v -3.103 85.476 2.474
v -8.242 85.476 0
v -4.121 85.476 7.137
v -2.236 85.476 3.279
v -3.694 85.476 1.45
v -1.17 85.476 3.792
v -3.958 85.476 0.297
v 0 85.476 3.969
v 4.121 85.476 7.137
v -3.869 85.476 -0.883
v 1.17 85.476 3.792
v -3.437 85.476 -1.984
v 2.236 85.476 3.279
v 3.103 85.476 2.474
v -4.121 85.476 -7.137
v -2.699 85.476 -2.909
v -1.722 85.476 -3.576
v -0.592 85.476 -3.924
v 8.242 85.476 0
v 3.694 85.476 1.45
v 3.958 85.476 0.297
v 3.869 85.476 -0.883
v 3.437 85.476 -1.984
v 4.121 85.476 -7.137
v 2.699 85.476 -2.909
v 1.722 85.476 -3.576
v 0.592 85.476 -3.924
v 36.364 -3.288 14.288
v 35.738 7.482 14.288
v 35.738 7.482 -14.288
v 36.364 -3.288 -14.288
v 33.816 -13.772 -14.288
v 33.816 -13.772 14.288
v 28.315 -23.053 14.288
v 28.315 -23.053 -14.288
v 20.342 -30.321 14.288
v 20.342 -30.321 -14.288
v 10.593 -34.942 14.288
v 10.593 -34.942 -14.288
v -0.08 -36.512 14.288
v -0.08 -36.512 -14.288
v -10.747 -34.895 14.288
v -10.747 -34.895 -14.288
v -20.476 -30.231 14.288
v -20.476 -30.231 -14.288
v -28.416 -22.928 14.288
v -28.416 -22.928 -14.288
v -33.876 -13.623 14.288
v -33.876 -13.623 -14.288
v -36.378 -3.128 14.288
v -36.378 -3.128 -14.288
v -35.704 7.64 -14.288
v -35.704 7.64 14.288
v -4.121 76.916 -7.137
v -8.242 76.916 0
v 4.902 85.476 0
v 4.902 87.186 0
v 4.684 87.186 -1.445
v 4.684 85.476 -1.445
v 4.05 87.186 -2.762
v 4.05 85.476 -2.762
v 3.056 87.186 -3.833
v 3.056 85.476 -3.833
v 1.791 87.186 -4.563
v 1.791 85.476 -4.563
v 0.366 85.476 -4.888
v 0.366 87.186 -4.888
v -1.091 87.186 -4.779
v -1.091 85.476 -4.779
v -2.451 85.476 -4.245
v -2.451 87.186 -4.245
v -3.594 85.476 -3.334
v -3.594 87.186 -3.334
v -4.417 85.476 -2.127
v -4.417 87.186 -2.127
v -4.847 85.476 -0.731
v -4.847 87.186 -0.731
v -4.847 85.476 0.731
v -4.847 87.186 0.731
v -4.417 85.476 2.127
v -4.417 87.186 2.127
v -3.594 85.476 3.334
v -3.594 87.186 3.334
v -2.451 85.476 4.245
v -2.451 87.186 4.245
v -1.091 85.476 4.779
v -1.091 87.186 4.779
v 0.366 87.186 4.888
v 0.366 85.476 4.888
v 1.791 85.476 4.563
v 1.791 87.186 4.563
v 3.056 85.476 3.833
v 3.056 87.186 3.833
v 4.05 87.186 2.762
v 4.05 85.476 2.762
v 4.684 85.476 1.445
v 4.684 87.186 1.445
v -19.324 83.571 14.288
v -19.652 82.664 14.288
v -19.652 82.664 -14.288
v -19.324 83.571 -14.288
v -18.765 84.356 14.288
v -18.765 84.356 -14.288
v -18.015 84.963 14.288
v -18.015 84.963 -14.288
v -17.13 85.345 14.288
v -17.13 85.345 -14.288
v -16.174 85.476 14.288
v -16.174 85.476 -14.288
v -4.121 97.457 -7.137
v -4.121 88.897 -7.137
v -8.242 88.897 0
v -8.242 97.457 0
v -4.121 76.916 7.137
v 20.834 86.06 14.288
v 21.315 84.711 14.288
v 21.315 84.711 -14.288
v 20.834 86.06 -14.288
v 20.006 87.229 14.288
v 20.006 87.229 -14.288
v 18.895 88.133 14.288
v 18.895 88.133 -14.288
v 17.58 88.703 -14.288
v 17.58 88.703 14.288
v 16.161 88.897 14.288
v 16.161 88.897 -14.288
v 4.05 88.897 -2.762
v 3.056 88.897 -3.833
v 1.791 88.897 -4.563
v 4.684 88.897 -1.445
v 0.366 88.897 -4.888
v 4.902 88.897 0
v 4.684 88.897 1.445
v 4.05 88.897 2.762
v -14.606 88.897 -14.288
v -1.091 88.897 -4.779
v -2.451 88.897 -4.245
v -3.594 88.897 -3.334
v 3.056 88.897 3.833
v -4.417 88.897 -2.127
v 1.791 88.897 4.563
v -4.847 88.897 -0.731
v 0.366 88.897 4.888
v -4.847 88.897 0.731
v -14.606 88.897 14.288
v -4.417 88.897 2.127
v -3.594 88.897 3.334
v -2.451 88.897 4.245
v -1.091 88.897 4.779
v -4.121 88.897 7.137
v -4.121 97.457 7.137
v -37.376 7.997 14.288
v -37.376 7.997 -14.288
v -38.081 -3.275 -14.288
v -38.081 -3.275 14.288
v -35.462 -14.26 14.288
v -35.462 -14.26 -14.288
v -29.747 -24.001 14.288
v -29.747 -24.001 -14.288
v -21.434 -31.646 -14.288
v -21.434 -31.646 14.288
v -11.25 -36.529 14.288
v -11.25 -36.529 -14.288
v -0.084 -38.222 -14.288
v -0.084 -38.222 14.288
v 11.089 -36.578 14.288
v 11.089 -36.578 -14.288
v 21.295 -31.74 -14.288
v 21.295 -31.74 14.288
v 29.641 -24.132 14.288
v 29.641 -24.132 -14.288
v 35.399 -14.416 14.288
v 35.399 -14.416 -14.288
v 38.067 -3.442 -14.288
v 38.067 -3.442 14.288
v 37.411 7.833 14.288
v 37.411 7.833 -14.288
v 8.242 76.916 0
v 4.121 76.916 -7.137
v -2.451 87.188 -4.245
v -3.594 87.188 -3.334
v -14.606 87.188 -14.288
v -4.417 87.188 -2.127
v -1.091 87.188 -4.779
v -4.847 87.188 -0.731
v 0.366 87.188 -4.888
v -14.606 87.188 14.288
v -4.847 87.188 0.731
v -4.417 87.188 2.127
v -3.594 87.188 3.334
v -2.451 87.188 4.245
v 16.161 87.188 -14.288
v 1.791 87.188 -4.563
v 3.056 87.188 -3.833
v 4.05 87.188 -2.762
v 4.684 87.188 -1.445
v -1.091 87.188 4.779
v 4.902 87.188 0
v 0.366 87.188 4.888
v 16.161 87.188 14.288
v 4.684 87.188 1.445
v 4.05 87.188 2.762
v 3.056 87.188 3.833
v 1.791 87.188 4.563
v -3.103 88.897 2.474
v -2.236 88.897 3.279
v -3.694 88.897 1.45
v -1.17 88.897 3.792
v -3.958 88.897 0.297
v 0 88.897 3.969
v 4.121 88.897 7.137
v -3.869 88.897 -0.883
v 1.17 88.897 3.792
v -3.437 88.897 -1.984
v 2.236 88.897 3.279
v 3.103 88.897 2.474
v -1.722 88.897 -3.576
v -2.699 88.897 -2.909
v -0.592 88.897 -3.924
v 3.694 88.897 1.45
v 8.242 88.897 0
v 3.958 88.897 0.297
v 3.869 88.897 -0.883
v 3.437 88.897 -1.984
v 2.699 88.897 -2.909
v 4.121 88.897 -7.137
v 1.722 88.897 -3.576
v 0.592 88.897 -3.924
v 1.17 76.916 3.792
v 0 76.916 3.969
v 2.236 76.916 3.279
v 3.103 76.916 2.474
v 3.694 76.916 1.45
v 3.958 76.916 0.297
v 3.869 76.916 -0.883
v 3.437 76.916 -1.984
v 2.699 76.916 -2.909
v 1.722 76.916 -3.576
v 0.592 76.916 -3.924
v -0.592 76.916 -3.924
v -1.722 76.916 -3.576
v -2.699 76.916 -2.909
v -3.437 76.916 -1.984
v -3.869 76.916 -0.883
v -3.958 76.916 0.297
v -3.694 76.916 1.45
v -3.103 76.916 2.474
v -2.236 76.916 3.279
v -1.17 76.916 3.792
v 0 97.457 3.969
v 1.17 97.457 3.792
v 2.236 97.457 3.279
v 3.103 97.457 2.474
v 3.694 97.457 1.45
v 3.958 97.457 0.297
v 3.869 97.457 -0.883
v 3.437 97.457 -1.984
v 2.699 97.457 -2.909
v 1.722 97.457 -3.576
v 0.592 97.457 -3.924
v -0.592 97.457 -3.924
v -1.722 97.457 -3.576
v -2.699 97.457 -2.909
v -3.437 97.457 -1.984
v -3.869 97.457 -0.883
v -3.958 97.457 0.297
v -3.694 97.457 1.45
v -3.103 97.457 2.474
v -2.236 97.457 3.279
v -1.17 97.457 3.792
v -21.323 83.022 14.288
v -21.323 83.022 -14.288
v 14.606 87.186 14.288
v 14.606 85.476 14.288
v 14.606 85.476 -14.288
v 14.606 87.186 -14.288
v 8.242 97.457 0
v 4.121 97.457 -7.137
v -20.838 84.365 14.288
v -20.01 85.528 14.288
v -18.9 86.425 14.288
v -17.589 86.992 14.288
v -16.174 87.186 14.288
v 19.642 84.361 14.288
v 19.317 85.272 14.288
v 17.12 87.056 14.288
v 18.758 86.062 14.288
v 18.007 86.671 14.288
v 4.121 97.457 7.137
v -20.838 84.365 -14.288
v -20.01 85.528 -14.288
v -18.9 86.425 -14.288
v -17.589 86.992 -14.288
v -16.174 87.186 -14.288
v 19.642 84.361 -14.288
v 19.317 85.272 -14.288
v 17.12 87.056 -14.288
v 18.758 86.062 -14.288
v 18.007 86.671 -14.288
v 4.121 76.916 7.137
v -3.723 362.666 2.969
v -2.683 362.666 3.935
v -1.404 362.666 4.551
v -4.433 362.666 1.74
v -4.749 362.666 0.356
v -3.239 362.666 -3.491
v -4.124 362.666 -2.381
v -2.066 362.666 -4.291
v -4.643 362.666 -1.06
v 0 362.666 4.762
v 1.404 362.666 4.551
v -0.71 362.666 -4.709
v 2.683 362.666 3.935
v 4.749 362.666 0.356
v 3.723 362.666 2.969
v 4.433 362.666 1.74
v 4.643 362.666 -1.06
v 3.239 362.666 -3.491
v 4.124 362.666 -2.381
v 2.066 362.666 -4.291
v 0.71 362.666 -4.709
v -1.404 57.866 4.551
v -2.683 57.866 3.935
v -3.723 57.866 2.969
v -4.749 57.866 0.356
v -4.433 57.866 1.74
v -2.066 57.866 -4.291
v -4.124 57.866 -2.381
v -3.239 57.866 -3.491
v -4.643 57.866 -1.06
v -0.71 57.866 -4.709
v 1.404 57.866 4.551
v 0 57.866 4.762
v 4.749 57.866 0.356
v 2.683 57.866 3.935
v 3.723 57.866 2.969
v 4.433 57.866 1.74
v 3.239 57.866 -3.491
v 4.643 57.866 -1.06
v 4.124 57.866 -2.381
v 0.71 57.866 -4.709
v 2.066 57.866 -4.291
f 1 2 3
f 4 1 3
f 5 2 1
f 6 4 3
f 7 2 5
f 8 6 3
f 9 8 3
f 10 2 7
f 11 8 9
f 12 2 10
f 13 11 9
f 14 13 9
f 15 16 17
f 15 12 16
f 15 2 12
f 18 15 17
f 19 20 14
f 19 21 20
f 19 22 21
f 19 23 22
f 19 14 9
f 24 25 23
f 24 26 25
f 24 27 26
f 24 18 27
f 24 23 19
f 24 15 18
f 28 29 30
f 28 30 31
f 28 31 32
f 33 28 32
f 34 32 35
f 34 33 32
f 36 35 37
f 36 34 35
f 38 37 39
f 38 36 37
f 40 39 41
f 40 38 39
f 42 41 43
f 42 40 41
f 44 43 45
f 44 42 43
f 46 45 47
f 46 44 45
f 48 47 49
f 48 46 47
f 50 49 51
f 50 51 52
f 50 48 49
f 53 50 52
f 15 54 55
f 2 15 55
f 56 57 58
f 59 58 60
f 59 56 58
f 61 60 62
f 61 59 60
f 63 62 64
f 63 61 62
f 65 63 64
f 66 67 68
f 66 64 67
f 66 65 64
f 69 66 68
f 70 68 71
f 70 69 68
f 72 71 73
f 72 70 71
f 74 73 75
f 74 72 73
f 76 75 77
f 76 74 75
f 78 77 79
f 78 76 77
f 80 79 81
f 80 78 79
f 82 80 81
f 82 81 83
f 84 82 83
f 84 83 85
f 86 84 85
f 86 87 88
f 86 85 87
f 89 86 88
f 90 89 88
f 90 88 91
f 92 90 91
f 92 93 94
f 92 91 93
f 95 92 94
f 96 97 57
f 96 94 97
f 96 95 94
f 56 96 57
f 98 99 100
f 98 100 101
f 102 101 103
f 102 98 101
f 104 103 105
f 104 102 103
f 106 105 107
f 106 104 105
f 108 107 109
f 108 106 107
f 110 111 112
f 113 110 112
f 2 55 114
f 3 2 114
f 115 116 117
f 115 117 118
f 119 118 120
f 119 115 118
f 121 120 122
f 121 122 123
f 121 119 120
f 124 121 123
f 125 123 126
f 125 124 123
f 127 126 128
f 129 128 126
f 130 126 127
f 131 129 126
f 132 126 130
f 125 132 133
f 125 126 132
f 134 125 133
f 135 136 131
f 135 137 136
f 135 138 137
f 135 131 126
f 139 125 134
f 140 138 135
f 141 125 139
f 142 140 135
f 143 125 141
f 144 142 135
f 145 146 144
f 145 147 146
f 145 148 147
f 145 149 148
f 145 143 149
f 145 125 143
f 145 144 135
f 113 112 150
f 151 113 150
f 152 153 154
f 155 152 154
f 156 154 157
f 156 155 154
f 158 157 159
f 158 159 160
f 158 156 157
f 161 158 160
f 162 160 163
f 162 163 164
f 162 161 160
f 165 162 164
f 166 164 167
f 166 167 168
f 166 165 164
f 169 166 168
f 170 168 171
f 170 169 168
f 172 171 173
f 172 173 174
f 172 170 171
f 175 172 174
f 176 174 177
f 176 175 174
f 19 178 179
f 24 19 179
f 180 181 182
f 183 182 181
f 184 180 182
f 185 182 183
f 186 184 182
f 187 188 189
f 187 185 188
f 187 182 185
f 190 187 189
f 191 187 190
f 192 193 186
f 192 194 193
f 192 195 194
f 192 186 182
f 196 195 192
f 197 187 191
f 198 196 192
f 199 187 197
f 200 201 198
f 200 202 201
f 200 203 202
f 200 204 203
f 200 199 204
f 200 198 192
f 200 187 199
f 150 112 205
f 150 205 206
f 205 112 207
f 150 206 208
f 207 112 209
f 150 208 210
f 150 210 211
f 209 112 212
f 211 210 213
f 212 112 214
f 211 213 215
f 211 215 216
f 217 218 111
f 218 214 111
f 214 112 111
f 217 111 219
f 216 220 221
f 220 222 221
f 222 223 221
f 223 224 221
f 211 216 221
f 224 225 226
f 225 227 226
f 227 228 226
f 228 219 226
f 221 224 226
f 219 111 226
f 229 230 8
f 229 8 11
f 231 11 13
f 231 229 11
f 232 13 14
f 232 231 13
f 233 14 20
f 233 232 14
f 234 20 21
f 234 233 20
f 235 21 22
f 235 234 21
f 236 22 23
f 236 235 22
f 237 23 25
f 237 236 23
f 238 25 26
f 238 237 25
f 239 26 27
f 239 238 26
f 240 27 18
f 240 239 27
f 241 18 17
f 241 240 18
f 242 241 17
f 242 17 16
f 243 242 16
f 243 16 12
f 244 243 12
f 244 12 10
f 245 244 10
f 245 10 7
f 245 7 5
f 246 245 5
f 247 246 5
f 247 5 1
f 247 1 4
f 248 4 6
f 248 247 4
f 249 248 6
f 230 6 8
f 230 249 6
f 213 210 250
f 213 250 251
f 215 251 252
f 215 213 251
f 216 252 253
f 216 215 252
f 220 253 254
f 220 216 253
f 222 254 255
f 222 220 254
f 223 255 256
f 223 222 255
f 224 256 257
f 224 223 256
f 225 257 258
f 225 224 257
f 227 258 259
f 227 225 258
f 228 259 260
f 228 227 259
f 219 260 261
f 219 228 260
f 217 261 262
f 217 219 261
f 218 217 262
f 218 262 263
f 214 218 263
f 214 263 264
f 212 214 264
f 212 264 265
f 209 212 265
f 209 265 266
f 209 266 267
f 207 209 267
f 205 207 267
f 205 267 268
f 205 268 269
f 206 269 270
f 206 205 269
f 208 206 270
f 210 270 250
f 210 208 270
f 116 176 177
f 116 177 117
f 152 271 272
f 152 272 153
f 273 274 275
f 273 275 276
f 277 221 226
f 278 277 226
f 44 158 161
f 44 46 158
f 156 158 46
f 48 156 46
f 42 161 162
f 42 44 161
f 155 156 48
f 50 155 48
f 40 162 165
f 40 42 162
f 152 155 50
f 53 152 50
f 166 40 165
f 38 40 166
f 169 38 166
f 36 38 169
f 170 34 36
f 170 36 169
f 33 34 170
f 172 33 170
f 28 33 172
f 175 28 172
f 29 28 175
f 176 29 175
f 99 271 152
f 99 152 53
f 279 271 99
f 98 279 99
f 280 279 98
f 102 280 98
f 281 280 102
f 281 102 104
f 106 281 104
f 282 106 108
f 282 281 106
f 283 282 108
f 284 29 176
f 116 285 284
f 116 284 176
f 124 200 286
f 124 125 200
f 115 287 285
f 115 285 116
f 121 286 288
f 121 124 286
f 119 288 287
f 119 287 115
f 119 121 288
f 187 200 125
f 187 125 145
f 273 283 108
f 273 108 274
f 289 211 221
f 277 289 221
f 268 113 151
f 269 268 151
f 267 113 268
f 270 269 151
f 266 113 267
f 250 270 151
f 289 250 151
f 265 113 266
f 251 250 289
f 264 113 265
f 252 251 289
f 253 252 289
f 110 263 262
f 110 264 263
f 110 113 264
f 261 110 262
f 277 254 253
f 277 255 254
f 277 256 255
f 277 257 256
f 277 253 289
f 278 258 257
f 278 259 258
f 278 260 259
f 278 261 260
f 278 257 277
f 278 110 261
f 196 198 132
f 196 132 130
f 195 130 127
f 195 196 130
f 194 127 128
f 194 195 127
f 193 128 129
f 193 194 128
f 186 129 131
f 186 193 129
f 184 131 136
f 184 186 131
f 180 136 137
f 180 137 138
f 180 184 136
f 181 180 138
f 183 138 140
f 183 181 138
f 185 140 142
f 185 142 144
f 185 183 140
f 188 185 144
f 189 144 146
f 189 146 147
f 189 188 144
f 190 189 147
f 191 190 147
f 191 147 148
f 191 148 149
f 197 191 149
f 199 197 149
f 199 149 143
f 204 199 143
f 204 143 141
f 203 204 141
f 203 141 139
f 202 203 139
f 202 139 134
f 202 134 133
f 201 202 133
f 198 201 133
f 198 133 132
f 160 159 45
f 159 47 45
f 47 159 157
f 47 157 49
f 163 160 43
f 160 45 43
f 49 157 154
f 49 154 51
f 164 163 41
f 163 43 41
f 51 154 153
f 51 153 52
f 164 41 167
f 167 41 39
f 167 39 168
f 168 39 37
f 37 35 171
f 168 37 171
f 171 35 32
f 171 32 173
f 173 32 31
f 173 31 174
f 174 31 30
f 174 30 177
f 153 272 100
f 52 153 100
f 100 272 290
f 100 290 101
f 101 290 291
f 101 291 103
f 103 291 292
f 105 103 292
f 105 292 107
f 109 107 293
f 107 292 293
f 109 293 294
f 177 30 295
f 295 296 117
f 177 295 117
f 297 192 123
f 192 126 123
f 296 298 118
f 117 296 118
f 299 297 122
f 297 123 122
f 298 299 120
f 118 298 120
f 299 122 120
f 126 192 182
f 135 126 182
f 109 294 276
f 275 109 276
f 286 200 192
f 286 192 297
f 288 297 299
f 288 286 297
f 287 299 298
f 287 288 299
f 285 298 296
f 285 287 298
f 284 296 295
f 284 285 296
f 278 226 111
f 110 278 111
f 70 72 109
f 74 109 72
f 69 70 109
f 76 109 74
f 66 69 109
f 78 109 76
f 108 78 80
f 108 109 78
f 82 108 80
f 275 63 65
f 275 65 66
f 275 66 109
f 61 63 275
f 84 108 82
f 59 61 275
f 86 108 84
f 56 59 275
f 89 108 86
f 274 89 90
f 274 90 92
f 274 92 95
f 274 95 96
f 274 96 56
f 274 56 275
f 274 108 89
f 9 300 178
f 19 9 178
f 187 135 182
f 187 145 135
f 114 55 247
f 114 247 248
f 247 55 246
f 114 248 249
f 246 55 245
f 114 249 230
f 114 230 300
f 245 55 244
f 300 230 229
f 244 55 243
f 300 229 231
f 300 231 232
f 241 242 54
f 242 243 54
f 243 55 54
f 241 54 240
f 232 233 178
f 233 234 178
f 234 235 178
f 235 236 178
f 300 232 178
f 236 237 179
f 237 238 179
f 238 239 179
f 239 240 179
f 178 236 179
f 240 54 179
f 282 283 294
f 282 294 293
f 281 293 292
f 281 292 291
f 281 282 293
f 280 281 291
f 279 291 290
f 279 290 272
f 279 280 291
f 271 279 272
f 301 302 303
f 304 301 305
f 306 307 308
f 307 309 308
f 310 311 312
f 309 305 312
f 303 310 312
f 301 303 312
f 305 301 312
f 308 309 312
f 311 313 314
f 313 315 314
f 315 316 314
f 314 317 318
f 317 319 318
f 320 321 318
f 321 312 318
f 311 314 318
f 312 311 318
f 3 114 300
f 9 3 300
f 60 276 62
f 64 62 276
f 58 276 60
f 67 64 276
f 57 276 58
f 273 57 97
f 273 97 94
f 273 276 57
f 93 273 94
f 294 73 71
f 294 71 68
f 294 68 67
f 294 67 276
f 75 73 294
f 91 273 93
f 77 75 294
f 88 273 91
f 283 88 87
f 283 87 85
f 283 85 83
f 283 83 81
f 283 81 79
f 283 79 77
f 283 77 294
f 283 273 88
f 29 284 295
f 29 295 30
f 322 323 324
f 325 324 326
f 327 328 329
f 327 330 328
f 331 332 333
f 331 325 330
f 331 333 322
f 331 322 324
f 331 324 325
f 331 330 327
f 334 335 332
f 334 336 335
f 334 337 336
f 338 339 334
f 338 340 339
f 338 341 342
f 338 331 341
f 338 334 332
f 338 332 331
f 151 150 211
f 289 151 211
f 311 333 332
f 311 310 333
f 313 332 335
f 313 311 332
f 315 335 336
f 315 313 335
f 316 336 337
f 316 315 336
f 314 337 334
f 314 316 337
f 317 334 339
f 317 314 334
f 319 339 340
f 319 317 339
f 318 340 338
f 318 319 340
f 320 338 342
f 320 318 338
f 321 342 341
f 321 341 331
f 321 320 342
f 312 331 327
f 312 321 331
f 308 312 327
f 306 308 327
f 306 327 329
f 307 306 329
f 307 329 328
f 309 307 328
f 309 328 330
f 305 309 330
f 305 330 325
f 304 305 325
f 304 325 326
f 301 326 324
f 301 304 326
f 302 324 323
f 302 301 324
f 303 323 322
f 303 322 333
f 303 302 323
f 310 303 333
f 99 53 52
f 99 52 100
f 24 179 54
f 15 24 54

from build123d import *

# Parameters (mm, degrees)
BASE_FLANGE1_DEPTH              = 14.2875
F_1_2_START                     = 85.47608
F_1_2_CLEARANCE_HOLE2_OUTLINE_R = 4.9022
F_1_2_CLEARANCE_HOLE2_DEPTH     = 3.42138
NUT_SKETCH_R                    = 3.96875
NUT_DEPTH                       = 8.5598
ROD_SKETCH_W                    = 4.7625
ROD_SKETCH_H                    = 304.8


with BuildPart() as part:
    # Base-Flange1: sheet metal written as solids
    # Sketch1 → Base-Flange1 (new, symmetric)
    with BuildSketch(Plane.XY):
        with BuildLine():
            Line((-14.605508, 87.18804), (16.161402617, 87.18804))
            ThreePointArc((16.161402617, 87.18804), (18.403484856, 86.392149279), (19.641938046, 84.360743731))
            Line((19.641938046, 84.360743731), (35.737640565, 7.482225813))
            ThreePointArc((35.737640565, 7.482225813), (-0.080380921, -36.512411522), (-35.704350556, 7.6395031))
            Line((-35.704350556, 7.6395031), (-19.651666762, 82.664101172))
            ThreePointArc((-19.651666762, 82.664101172), (-18.410374017, 84.685118452), (-16.17437349, 85.47608))
            Line((-16.17437349, 85.47608), (14.605508, 85.47608))
            Line((14.605508, 85.47608), (14.605508, 87.1855))
            Line((14.605508, 87.1855), (-16.17437349, 87.1855))
            ThreePointArc((-16.17437349, 87.1855), (-19.485251413, 86.014311937), (-21.323251313, 83.021762778))
            Line((-21.323251313, 83.021762778), (-37.375935107, 7.997164706))
            ThreePointArc((-37.375935107, 7.997164706), (-0.084144146, -38.22182738), (37.410783667, 7.832524107))
            Line((37.410783667, 7.832524107), (21.315081149, 84.711042025))
            ThreePointArc((21.315081149, 84.711042025), (19.481285818, 87.71897324), (16.161402617, 88.89746))
            Line((16.161402617, 88.89746), (-14.605508, 88.89746))
            Line((-14.605508, 88.89746), (-14.605508, 87.18804))
        make_face()
    extrude(amount=BASE_FLANGE1_DEPTH, both=True)

    # 1/2 Clearance Hole2: read off the stored shape, not the designer's step
    # 1/2 Clearance Hole2 outline → 1/2 Clearance Hole2 (cut)
    with BuildSketch(Plane(origin=(0, 0, 0), x_dir=(1, 0, 0), z_dir=(0, 1, 0)).offset(F_1_2_START)):
        Circle(F_1_2_CLEARANCE_HOLE2_OUTLINE_R)
    extrude(amount=F_1_2_CLEARANCE_HOLE2_DEPTH, mode=Mode.SUBTRACT)


with BuildPart() as body_2:
    # Nut_Sketch → Nut (new body)
    with BuildSketch(Plane(origin=(0, 88.89746, 0), x_dir=(1, 0, 0), z_dir=(0, 1, 0))):
        Polygon((8.241559623, 0), (4.120779811, 7.1374), (-4.120779811, 7.1374), (-8.241559623, 0), (-4.120779811, -7.1374), (4.120779811, -7.1374), align=None)
        with Locations(Location((0, 0, 0), (0, 0, 270))):
            Circle(NUT_SKETCH_R, mode=Mode.SUBTRACT)
    extrude(amount=NUT_DEPTH)


with BuildPart() as body_3:
    # Body-Move/Copy1: copy of body 2
    add(body_2.part.moved(Location((0, -32.460651761, 0))))


with BuildPart() as body_3_1:
    # Body-Move/Copy2: read off the stored shape, not the designer's step
    # Body-Move/Copy2: moved
    add(body_3.part.moved(Location((0, 20.4794718, 0))))


with BuildPart() as body_4:
    # Rod_Sketch → Rod (revolve)
    with BuildSketch(Plane.XY, mode=Mode.PRIVATE) as rod_sk:
        with Locations((2.38125, 210.26628)):
            Rectangle(ROD_SKETCH_W, ROD_SKETCH_H)
    revolve(rod_sk.sketch.rotate(Axis((0, 0, 0), (0, 1, 0)), 270), axis=Axis((0, 0, 0), (0, 1, 0)))


solid = Compound([part.part, body_2.part, body_3_1.part, body_4.part])
